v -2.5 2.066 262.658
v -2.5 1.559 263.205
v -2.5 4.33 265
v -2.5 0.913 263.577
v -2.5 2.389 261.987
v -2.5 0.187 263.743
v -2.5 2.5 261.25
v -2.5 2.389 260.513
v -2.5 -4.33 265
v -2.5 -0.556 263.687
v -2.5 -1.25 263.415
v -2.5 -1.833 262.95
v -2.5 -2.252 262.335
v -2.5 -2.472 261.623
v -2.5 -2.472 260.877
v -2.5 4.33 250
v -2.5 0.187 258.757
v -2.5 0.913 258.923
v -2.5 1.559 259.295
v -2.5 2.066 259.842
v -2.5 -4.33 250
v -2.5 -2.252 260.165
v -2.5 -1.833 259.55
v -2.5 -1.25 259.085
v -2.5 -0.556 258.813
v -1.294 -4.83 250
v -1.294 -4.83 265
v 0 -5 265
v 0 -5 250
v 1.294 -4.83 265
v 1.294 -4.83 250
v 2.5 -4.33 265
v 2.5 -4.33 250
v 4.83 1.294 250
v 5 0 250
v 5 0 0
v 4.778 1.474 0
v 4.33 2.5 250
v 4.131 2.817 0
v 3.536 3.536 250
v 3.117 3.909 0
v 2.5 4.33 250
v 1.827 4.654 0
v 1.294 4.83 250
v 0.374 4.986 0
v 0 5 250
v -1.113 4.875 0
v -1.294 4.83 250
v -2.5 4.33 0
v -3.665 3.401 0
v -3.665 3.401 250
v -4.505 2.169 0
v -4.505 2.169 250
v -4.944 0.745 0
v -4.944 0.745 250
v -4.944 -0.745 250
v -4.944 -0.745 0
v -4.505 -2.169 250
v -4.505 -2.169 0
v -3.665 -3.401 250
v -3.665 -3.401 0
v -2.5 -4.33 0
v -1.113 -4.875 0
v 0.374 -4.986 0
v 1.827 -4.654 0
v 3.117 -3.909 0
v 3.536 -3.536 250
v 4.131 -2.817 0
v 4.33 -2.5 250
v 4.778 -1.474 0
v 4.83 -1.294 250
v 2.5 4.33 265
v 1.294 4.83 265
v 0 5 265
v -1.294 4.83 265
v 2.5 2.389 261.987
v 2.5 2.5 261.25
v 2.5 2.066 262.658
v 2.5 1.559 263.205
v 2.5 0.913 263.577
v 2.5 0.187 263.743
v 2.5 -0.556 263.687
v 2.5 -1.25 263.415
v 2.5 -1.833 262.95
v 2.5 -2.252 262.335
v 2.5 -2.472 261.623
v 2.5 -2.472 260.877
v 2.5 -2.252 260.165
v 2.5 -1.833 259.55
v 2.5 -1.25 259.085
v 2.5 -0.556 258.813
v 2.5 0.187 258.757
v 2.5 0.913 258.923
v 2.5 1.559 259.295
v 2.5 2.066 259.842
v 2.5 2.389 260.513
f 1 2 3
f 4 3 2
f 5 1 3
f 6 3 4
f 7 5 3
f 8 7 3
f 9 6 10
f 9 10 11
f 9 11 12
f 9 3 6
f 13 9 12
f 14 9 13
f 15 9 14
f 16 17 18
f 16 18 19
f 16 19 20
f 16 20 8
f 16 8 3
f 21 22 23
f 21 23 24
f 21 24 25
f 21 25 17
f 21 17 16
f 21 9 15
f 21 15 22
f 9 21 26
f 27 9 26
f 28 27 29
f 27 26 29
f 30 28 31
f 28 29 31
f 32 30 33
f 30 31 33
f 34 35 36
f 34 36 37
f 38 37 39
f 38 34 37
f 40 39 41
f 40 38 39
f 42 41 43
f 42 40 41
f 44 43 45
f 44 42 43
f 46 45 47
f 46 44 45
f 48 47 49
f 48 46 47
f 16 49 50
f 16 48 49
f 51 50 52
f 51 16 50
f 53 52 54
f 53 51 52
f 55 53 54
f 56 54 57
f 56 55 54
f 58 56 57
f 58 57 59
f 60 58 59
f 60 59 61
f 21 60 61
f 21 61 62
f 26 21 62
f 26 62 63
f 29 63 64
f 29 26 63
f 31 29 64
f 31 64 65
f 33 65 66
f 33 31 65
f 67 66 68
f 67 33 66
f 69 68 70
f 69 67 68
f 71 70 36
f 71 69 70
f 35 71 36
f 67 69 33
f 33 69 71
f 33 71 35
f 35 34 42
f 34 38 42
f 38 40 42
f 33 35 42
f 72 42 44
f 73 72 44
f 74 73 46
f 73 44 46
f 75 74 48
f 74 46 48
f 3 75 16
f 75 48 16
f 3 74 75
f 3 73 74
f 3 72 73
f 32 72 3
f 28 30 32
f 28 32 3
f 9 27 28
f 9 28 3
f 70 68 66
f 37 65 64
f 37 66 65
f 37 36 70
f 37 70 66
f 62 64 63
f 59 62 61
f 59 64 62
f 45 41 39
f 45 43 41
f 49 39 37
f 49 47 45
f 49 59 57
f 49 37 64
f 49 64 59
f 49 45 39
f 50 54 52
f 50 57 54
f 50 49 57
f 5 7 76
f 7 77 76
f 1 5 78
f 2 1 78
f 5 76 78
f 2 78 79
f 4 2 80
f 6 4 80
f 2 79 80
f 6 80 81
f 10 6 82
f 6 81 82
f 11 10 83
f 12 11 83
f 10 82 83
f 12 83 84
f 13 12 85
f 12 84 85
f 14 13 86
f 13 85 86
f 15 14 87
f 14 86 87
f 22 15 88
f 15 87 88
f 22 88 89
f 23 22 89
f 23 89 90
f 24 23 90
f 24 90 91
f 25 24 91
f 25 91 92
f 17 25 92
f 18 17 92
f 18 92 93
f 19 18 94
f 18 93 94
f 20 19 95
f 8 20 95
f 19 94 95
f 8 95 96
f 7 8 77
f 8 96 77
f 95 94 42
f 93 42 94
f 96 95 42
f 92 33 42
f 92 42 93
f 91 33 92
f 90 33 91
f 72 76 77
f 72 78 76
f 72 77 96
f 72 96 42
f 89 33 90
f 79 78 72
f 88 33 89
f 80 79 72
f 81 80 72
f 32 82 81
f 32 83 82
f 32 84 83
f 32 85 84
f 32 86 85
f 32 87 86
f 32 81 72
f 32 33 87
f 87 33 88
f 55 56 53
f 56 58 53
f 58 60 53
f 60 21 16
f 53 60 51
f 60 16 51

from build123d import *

# Parameters (mm, degrees)
F0_W     = 5
F0_H     = 250
F3_DEPTH = 5.6
F4_DEPTH = 15.001
F5_R     = 2.5
F6_DEPTH = 12.5


with BuildPart() as f1:
    # F0 (on Front) → F1 (revolve)
    with BuildSketch(Plane.XZ):
        with Locations((2.5, 125)):
            Rectangle(F0_W, F0_H)
    revolve(axis=Axis((0, 0, 125), (0, 0, 1)))

    # F2 (on Front) → F3 (join, symmetric)
    with BuildSketch(Plane.XZ):
        Polygon((2.5, 265), (0, 265), (-2.5, 265), (-2.5, 250), (0, 250), (2.5, 250), align=None)
    extrude(amount=F3_DEPTH, both=True)

    # F4 (cut, through all): faces of the model
    f4_faces = [f1.faces().sort_by_distance(p)[0] for p in [
        (0, 5.1676416456, 250),
        (0, -5.1676416456, 250),
    ]]
    extrude(f4_faces, amount=-F4_DEPTH, mode=Mode.SUBTRACT)

    # F5 (on Right) → F6 (cut, symmetric)
    with BuildSketch(Plane.YZ):
        with Locations((0, 261.25)):
            Circle(F5_R)
    extrude(amount=F6_DEPTH, both=True, mode=Mode.SUBTRACT)


solid = f1.part
